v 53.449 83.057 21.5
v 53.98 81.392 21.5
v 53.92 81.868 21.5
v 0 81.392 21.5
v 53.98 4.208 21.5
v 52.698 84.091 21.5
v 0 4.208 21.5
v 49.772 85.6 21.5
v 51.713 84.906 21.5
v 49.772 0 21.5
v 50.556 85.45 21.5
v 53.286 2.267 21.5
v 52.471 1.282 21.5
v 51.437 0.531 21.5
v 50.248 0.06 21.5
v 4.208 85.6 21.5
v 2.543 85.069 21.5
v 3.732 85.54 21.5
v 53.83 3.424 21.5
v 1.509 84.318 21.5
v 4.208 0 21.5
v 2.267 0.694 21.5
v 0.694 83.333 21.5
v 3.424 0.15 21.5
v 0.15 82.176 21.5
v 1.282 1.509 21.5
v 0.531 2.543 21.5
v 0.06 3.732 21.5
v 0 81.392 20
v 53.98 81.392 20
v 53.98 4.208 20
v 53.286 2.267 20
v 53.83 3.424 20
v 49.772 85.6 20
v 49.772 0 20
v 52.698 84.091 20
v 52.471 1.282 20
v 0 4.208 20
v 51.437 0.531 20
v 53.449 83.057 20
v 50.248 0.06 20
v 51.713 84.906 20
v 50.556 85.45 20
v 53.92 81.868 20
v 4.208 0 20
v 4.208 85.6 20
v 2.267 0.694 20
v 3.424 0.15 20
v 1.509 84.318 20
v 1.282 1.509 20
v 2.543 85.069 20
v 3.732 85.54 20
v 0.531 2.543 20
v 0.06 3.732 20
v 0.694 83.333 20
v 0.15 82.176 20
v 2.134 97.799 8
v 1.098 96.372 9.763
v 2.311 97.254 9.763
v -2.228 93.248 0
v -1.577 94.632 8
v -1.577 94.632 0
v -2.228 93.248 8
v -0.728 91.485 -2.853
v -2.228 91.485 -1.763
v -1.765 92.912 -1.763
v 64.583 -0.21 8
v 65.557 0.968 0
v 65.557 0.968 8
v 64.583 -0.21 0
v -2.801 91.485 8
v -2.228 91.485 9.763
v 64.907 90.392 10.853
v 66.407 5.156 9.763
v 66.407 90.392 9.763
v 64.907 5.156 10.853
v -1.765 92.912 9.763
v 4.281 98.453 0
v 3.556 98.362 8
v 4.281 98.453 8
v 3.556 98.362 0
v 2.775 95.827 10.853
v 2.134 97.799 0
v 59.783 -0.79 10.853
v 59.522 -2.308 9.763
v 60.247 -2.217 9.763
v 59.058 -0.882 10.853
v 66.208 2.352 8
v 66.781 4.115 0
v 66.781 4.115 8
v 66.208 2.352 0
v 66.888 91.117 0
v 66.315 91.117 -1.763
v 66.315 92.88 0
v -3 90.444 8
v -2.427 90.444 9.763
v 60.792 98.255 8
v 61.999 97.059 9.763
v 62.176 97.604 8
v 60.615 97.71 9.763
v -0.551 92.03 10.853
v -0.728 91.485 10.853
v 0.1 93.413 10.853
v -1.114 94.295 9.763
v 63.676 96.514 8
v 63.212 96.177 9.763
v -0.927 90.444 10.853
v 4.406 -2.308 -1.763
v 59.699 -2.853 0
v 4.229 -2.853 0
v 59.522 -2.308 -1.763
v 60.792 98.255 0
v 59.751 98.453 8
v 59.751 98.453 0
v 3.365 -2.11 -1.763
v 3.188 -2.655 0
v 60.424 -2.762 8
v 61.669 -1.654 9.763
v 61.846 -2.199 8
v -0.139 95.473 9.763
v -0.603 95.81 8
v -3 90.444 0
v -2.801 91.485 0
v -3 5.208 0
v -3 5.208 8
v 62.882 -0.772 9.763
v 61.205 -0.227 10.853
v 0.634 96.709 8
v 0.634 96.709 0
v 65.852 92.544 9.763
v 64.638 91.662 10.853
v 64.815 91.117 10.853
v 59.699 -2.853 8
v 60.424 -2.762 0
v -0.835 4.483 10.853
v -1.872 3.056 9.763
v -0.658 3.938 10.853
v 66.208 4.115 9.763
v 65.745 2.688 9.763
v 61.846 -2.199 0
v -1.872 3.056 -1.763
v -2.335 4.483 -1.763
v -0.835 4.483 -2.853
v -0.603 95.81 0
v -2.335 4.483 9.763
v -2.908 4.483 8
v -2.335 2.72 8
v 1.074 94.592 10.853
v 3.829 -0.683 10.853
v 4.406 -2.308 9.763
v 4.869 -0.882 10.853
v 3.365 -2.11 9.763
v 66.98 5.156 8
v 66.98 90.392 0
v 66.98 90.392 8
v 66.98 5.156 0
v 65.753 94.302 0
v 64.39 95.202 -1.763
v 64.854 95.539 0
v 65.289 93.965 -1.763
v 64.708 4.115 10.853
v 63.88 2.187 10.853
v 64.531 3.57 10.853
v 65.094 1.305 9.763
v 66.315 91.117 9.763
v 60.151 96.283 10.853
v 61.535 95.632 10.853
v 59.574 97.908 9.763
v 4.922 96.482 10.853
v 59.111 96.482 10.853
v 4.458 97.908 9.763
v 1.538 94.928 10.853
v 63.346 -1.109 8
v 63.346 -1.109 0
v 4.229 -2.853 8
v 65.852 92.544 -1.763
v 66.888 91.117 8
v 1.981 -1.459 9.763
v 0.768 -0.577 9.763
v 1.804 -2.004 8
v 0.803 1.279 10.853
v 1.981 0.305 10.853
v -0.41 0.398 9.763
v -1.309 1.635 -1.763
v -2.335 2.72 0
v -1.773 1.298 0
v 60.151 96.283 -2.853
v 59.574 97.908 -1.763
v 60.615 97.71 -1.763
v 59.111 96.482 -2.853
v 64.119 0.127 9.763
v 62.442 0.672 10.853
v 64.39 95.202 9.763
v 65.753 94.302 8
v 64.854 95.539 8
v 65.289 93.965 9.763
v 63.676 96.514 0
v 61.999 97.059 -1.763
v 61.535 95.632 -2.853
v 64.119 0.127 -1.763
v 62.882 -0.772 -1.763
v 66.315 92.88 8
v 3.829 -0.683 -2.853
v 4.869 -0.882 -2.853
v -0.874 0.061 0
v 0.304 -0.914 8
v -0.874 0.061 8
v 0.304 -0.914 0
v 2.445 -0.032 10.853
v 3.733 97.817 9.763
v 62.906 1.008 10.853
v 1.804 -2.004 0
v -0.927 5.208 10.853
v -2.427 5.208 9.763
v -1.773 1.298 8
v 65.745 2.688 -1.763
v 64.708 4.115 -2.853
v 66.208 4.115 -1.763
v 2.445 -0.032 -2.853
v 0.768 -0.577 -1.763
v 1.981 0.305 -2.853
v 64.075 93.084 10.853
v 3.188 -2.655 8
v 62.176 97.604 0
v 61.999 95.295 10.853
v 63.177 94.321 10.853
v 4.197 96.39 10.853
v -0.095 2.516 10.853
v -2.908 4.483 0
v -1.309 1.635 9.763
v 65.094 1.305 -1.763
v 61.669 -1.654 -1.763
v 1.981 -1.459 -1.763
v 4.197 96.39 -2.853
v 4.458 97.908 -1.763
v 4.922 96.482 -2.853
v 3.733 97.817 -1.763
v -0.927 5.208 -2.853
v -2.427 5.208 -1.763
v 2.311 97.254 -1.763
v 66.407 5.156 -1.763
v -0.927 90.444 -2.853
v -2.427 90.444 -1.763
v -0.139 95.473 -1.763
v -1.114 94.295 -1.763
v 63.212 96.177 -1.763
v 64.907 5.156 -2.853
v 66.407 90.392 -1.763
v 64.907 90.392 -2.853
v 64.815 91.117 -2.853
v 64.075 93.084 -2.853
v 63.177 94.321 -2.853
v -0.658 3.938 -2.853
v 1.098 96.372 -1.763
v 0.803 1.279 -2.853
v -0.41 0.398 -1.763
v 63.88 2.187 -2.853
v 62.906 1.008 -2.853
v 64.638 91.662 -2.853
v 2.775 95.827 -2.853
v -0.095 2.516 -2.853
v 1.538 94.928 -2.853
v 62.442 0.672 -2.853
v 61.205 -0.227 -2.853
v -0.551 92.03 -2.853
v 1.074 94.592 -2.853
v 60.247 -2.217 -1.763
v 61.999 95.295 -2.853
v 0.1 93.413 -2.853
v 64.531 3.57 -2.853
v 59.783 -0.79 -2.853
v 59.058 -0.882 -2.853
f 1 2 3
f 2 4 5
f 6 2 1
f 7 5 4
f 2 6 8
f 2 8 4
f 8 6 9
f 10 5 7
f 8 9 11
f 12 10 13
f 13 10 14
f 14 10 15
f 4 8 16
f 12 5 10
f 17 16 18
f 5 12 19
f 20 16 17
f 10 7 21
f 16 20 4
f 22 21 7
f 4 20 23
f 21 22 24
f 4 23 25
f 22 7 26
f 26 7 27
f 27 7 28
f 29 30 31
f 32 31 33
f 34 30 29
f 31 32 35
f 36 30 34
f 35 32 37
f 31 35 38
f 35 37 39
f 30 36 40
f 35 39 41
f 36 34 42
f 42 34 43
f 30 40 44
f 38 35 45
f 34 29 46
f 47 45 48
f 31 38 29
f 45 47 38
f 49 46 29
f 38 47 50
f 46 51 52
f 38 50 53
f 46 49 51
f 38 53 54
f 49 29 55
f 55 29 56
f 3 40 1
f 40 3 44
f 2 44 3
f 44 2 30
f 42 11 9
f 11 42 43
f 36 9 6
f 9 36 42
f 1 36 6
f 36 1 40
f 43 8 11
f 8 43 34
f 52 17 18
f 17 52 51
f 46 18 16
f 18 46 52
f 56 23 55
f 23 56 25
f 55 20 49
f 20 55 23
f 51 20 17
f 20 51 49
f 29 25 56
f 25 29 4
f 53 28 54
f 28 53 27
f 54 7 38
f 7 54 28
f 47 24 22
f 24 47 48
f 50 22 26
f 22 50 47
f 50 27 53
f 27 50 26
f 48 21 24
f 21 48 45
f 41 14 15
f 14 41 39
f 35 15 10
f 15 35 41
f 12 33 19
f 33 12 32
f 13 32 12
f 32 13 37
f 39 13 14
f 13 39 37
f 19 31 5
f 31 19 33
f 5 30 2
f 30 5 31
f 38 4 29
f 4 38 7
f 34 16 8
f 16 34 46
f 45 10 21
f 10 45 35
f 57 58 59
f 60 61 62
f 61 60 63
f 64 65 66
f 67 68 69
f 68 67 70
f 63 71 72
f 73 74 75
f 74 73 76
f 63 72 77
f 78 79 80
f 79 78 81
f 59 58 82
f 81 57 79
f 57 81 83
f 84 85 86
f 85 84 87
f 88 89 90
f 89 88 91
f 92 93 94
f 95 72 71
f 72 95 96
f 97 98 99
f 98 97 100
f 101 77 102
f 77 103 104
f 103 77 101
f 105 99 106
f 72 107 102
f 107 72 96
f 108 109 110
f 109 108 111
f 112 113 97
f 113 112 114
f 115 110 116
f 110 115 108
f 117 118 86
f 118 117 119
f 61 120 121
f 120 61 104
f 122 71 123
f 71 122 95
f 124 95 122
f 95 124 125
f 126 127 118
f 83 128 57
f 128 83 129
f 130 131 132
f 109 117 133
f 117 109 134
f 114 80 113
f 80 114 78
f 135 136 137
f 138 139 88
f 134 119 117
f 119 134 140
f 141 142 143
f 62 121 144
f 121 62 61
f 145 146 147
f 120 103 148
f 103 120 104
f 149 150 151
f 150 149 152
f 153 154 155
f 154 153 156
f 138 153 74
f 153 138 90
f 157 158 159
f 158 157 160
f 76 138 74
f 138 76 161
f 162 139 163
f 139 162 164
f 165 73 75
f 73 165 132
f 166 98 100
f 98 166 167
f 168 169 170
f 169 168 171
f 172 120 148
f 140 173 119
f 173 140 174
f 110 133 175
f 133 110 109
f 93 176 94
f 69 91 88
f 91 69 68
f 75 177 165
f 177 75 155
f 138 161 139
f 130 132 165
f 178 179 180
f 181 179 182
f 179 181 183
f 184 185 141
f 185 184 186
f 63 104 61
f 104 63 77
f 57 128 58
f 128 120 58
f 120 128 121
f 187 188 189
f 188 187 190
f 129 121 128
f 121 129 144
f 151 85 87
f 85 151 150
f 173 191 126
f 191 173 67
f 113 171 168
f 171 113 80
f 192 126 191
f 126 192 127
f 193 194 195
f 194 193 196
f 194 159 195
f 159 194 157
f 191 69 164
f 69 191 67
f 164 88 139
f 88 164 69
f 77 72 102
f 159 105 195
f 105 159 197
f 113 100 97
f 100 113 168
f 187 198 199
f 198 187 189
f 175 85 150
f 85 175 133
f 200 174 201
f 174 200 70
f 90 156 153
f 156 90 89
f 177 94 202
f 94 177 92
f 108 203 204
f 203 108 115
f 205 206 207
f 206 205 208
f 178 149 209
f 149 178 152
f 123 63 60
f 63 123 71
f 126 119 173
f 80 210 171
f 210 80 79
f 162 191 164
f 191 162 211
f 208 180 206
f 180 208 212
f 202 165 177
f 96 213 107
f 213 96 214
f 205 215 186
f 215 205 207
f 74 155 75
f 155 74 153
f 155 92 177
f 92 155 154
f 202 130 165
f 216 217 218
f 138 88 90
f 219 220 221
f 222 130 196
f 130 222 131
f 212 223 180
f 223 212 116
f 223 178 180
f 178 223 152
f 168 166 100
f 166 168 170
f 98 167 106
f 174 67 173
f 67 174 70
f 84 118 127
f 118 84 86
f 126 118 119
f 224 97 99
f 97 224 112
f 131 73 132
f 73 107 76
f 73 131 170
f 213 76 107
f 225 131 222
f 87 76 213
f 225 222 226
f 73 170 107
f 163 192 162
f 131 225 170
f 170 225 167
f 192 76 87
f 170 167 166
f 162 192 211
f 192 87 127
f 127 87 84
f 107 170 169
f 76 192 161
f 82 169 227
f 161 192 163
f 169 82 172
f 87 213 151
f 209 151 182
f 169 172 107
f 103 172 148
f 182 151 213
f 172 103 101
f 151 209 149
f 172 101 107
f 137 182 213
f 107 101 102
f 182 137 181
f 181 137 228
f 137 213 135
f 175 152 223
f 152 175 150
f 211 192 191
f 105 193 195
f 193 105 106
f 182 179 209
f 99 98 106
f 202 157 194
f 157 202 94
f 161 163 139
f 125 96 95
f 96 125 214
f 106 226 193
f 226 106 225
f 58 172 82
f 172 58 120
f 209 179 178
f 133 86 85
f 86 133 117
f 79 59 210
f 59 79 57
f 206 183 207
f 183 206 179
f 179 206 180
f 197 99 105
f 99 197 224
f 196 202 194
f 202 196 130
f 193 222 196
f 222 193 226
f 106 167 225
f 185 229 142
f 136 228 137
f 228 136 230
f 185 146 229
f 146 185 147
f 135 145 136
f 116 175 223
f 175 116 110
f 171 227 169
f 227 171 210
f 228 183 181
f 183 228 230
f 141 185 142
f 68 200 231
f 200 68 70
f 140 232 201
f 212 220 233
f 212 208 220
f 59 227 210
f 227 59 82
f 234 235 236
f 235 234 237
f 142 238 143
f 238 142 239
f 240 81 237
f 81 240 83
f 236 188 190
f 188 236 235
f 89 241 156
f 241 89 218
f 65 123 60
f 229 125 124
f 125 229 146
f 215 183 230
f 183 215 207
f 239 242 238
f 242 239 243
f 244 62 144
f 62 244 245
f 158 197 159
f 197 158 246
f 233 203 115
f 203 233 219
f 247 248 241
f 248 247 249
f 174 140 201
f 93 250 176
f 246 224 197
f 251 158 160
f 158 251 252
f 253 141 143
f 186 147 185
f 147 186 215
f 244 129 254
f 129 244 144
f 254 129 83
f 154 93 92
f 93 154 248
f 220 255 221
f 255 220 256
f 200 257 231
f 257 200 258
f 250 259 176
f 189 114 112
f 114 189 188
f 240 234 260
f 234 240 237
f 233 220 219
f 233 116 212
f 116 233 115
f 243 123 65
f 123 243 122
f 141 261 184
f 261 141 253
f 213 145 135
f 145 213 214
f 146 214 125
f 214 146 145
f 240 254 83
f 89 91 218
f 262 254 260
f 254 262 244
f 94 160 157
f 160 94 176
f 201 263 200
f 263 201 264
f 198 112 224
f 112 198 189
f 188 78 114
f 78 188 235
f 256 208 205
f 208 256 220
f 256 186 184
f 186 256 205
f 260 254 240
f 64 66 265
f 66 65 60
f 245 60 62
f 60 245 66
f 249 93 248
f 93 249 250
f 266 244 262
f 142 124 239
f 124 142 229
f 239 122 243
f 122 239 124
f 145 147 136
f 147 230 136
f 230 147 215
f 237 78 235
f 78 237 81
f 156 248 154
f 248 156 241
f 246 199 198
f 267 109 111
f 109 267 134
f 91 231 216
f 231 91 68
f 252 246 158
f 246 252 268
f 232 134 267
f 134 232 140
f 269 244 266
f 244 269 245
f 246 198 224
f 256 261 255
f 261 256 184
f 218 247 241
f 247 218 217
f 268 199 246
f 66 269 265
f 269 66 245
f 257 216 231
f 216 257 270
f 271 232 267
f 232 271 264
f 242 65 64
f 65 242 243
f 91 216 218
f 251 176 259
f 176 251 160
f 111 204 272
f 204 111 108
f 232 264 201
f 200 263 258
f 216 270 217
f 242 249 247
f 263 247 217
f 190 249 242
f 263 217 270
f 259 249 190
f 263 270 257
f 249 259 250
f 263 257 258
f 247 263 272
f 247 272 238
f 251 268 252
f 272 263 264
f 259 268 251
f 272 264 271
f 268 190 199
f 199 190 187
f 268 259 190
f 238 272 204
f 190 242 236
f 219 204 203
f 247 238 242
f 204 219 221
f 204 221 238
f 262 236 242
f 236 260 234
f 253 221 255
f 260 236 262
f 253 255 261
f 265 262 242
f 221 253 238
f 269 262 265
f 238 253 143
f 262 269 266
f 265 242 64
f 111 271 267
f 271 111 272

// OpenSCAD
// file: roundCornersCube.scad
/*
http://codeviewer.org/view/code:1b36 
Copyright (C) 2011 Sergio Vilches
This program is free software: you can redistribute it and/or modify it under the terms of the GNU General Public License as published by the Free Software Foundation, either version 3 of the License, or (at your option) any later version.
This program is distributed in the hope that it will be useful, but WITHOUT ANY WARRANTY; without even the implied warranty of MERCHANTABILITY or FITNESS FOR A PARTICULAR PURPOSE. See the GNU General Public License for more details. You should have received a copy of the GNU General Public License along with this program. If not, see <http://www.gnu.org/licenses/>.
Contact: s.vilches.e@gmail.com


    ----------------------------------------------------------- 
                 Round Corners Cube (Extruded)                
      roundCornersCube(x,y,z,r) Where:                        
         - x = Xdir width                                     
         - y = Ydir width                                     
         - z = Height of the cube                             
         - r = Rounding radious                               
                                                              
      Example: roundCornerCube(10,10,2,1);                    
     *Some times it's needed to use F6 to see good results!   
 	 ----------------------------------------------------------- 
*/
// Test it!
// roundCornersCube(10,5,2,1);


module createMeniscus(h,radius) // This module creates the shape that needs to be substracted from a cube to make its corners rounded.
difference(){        //This shape is basicly the difference between a quarter of cylinder and a cube
   translate([radius/2+0.1,radius/2+0.1,0]){
      cube([radius+0.2,radius+0.1,h+0.2],center=true);         // All that 0.x numbers are to avoid "ghost boundaries" when substracting
   }

   cylinder(h=h+0.2,r=radius,$fn = 25,center=true);
}


module rCube(x,y,z,r)  // Now we just substract the shape we have created in the four corners
difference(){
   cube([x,y,z], center=true);

translate([x/2-r,y/2-r]){  // We move to the first corner (x,y)
      rotate(0){  
         createMeniscus(z,r); // And substract the meniscus
      }
   }
   translate([-x/2+r,y/2-r]){ // To the second corner (-x,y)
      rotate(90){
         createMeniscus(z,r); // But this time we have to rotate the meniscus 90 deg
      }
   }
      translate([-x/2+r,-y/2+r]){ // ... 
      rotate(180){
         createMeniscus(z,r);
      }
   }
      translate([x/2-r,-y/2+r]){
      rotate(270){
         createMeniscus(z,r);
      }
   }
}

module createSubtractor(h,radius) //Create the shape that needs to be substracted from a cube
difference(){ cube([radius+0.1,radius+0.1,h]); cylinder(h=h,r=radius+0.1,$fn = 25); } //+0.1 stops ghost edges

module rCube(x,y,z,r)//Create a cube and subtract the 4 corners
difference(){
cube([x,y,z]);
translate([x-r,y-r]) rotate(0) createSubtractor(z,r); 
translate([r,y-r]) rotate(90) createSubtractor(z,r);
translate([r,r]) rotate(180) createSubtractor(z,r);
translate([x-r,r]) rotate(270) createSubtractor(z,r);
}
// main file
include <roundCornersCube.scad>

//credit card width
cw = 53.98;

ch = 85.6;

w = 5;

module credit_card()
{
rCube(cw,ch,1.5,5);


}

module wallet()
{
rCube(cw+w*2, ch+w*2, 8, 6);


}


translate([0,0,20])
credit_card();

minkowski()
{
sphere(r=3);
wallet();
}
